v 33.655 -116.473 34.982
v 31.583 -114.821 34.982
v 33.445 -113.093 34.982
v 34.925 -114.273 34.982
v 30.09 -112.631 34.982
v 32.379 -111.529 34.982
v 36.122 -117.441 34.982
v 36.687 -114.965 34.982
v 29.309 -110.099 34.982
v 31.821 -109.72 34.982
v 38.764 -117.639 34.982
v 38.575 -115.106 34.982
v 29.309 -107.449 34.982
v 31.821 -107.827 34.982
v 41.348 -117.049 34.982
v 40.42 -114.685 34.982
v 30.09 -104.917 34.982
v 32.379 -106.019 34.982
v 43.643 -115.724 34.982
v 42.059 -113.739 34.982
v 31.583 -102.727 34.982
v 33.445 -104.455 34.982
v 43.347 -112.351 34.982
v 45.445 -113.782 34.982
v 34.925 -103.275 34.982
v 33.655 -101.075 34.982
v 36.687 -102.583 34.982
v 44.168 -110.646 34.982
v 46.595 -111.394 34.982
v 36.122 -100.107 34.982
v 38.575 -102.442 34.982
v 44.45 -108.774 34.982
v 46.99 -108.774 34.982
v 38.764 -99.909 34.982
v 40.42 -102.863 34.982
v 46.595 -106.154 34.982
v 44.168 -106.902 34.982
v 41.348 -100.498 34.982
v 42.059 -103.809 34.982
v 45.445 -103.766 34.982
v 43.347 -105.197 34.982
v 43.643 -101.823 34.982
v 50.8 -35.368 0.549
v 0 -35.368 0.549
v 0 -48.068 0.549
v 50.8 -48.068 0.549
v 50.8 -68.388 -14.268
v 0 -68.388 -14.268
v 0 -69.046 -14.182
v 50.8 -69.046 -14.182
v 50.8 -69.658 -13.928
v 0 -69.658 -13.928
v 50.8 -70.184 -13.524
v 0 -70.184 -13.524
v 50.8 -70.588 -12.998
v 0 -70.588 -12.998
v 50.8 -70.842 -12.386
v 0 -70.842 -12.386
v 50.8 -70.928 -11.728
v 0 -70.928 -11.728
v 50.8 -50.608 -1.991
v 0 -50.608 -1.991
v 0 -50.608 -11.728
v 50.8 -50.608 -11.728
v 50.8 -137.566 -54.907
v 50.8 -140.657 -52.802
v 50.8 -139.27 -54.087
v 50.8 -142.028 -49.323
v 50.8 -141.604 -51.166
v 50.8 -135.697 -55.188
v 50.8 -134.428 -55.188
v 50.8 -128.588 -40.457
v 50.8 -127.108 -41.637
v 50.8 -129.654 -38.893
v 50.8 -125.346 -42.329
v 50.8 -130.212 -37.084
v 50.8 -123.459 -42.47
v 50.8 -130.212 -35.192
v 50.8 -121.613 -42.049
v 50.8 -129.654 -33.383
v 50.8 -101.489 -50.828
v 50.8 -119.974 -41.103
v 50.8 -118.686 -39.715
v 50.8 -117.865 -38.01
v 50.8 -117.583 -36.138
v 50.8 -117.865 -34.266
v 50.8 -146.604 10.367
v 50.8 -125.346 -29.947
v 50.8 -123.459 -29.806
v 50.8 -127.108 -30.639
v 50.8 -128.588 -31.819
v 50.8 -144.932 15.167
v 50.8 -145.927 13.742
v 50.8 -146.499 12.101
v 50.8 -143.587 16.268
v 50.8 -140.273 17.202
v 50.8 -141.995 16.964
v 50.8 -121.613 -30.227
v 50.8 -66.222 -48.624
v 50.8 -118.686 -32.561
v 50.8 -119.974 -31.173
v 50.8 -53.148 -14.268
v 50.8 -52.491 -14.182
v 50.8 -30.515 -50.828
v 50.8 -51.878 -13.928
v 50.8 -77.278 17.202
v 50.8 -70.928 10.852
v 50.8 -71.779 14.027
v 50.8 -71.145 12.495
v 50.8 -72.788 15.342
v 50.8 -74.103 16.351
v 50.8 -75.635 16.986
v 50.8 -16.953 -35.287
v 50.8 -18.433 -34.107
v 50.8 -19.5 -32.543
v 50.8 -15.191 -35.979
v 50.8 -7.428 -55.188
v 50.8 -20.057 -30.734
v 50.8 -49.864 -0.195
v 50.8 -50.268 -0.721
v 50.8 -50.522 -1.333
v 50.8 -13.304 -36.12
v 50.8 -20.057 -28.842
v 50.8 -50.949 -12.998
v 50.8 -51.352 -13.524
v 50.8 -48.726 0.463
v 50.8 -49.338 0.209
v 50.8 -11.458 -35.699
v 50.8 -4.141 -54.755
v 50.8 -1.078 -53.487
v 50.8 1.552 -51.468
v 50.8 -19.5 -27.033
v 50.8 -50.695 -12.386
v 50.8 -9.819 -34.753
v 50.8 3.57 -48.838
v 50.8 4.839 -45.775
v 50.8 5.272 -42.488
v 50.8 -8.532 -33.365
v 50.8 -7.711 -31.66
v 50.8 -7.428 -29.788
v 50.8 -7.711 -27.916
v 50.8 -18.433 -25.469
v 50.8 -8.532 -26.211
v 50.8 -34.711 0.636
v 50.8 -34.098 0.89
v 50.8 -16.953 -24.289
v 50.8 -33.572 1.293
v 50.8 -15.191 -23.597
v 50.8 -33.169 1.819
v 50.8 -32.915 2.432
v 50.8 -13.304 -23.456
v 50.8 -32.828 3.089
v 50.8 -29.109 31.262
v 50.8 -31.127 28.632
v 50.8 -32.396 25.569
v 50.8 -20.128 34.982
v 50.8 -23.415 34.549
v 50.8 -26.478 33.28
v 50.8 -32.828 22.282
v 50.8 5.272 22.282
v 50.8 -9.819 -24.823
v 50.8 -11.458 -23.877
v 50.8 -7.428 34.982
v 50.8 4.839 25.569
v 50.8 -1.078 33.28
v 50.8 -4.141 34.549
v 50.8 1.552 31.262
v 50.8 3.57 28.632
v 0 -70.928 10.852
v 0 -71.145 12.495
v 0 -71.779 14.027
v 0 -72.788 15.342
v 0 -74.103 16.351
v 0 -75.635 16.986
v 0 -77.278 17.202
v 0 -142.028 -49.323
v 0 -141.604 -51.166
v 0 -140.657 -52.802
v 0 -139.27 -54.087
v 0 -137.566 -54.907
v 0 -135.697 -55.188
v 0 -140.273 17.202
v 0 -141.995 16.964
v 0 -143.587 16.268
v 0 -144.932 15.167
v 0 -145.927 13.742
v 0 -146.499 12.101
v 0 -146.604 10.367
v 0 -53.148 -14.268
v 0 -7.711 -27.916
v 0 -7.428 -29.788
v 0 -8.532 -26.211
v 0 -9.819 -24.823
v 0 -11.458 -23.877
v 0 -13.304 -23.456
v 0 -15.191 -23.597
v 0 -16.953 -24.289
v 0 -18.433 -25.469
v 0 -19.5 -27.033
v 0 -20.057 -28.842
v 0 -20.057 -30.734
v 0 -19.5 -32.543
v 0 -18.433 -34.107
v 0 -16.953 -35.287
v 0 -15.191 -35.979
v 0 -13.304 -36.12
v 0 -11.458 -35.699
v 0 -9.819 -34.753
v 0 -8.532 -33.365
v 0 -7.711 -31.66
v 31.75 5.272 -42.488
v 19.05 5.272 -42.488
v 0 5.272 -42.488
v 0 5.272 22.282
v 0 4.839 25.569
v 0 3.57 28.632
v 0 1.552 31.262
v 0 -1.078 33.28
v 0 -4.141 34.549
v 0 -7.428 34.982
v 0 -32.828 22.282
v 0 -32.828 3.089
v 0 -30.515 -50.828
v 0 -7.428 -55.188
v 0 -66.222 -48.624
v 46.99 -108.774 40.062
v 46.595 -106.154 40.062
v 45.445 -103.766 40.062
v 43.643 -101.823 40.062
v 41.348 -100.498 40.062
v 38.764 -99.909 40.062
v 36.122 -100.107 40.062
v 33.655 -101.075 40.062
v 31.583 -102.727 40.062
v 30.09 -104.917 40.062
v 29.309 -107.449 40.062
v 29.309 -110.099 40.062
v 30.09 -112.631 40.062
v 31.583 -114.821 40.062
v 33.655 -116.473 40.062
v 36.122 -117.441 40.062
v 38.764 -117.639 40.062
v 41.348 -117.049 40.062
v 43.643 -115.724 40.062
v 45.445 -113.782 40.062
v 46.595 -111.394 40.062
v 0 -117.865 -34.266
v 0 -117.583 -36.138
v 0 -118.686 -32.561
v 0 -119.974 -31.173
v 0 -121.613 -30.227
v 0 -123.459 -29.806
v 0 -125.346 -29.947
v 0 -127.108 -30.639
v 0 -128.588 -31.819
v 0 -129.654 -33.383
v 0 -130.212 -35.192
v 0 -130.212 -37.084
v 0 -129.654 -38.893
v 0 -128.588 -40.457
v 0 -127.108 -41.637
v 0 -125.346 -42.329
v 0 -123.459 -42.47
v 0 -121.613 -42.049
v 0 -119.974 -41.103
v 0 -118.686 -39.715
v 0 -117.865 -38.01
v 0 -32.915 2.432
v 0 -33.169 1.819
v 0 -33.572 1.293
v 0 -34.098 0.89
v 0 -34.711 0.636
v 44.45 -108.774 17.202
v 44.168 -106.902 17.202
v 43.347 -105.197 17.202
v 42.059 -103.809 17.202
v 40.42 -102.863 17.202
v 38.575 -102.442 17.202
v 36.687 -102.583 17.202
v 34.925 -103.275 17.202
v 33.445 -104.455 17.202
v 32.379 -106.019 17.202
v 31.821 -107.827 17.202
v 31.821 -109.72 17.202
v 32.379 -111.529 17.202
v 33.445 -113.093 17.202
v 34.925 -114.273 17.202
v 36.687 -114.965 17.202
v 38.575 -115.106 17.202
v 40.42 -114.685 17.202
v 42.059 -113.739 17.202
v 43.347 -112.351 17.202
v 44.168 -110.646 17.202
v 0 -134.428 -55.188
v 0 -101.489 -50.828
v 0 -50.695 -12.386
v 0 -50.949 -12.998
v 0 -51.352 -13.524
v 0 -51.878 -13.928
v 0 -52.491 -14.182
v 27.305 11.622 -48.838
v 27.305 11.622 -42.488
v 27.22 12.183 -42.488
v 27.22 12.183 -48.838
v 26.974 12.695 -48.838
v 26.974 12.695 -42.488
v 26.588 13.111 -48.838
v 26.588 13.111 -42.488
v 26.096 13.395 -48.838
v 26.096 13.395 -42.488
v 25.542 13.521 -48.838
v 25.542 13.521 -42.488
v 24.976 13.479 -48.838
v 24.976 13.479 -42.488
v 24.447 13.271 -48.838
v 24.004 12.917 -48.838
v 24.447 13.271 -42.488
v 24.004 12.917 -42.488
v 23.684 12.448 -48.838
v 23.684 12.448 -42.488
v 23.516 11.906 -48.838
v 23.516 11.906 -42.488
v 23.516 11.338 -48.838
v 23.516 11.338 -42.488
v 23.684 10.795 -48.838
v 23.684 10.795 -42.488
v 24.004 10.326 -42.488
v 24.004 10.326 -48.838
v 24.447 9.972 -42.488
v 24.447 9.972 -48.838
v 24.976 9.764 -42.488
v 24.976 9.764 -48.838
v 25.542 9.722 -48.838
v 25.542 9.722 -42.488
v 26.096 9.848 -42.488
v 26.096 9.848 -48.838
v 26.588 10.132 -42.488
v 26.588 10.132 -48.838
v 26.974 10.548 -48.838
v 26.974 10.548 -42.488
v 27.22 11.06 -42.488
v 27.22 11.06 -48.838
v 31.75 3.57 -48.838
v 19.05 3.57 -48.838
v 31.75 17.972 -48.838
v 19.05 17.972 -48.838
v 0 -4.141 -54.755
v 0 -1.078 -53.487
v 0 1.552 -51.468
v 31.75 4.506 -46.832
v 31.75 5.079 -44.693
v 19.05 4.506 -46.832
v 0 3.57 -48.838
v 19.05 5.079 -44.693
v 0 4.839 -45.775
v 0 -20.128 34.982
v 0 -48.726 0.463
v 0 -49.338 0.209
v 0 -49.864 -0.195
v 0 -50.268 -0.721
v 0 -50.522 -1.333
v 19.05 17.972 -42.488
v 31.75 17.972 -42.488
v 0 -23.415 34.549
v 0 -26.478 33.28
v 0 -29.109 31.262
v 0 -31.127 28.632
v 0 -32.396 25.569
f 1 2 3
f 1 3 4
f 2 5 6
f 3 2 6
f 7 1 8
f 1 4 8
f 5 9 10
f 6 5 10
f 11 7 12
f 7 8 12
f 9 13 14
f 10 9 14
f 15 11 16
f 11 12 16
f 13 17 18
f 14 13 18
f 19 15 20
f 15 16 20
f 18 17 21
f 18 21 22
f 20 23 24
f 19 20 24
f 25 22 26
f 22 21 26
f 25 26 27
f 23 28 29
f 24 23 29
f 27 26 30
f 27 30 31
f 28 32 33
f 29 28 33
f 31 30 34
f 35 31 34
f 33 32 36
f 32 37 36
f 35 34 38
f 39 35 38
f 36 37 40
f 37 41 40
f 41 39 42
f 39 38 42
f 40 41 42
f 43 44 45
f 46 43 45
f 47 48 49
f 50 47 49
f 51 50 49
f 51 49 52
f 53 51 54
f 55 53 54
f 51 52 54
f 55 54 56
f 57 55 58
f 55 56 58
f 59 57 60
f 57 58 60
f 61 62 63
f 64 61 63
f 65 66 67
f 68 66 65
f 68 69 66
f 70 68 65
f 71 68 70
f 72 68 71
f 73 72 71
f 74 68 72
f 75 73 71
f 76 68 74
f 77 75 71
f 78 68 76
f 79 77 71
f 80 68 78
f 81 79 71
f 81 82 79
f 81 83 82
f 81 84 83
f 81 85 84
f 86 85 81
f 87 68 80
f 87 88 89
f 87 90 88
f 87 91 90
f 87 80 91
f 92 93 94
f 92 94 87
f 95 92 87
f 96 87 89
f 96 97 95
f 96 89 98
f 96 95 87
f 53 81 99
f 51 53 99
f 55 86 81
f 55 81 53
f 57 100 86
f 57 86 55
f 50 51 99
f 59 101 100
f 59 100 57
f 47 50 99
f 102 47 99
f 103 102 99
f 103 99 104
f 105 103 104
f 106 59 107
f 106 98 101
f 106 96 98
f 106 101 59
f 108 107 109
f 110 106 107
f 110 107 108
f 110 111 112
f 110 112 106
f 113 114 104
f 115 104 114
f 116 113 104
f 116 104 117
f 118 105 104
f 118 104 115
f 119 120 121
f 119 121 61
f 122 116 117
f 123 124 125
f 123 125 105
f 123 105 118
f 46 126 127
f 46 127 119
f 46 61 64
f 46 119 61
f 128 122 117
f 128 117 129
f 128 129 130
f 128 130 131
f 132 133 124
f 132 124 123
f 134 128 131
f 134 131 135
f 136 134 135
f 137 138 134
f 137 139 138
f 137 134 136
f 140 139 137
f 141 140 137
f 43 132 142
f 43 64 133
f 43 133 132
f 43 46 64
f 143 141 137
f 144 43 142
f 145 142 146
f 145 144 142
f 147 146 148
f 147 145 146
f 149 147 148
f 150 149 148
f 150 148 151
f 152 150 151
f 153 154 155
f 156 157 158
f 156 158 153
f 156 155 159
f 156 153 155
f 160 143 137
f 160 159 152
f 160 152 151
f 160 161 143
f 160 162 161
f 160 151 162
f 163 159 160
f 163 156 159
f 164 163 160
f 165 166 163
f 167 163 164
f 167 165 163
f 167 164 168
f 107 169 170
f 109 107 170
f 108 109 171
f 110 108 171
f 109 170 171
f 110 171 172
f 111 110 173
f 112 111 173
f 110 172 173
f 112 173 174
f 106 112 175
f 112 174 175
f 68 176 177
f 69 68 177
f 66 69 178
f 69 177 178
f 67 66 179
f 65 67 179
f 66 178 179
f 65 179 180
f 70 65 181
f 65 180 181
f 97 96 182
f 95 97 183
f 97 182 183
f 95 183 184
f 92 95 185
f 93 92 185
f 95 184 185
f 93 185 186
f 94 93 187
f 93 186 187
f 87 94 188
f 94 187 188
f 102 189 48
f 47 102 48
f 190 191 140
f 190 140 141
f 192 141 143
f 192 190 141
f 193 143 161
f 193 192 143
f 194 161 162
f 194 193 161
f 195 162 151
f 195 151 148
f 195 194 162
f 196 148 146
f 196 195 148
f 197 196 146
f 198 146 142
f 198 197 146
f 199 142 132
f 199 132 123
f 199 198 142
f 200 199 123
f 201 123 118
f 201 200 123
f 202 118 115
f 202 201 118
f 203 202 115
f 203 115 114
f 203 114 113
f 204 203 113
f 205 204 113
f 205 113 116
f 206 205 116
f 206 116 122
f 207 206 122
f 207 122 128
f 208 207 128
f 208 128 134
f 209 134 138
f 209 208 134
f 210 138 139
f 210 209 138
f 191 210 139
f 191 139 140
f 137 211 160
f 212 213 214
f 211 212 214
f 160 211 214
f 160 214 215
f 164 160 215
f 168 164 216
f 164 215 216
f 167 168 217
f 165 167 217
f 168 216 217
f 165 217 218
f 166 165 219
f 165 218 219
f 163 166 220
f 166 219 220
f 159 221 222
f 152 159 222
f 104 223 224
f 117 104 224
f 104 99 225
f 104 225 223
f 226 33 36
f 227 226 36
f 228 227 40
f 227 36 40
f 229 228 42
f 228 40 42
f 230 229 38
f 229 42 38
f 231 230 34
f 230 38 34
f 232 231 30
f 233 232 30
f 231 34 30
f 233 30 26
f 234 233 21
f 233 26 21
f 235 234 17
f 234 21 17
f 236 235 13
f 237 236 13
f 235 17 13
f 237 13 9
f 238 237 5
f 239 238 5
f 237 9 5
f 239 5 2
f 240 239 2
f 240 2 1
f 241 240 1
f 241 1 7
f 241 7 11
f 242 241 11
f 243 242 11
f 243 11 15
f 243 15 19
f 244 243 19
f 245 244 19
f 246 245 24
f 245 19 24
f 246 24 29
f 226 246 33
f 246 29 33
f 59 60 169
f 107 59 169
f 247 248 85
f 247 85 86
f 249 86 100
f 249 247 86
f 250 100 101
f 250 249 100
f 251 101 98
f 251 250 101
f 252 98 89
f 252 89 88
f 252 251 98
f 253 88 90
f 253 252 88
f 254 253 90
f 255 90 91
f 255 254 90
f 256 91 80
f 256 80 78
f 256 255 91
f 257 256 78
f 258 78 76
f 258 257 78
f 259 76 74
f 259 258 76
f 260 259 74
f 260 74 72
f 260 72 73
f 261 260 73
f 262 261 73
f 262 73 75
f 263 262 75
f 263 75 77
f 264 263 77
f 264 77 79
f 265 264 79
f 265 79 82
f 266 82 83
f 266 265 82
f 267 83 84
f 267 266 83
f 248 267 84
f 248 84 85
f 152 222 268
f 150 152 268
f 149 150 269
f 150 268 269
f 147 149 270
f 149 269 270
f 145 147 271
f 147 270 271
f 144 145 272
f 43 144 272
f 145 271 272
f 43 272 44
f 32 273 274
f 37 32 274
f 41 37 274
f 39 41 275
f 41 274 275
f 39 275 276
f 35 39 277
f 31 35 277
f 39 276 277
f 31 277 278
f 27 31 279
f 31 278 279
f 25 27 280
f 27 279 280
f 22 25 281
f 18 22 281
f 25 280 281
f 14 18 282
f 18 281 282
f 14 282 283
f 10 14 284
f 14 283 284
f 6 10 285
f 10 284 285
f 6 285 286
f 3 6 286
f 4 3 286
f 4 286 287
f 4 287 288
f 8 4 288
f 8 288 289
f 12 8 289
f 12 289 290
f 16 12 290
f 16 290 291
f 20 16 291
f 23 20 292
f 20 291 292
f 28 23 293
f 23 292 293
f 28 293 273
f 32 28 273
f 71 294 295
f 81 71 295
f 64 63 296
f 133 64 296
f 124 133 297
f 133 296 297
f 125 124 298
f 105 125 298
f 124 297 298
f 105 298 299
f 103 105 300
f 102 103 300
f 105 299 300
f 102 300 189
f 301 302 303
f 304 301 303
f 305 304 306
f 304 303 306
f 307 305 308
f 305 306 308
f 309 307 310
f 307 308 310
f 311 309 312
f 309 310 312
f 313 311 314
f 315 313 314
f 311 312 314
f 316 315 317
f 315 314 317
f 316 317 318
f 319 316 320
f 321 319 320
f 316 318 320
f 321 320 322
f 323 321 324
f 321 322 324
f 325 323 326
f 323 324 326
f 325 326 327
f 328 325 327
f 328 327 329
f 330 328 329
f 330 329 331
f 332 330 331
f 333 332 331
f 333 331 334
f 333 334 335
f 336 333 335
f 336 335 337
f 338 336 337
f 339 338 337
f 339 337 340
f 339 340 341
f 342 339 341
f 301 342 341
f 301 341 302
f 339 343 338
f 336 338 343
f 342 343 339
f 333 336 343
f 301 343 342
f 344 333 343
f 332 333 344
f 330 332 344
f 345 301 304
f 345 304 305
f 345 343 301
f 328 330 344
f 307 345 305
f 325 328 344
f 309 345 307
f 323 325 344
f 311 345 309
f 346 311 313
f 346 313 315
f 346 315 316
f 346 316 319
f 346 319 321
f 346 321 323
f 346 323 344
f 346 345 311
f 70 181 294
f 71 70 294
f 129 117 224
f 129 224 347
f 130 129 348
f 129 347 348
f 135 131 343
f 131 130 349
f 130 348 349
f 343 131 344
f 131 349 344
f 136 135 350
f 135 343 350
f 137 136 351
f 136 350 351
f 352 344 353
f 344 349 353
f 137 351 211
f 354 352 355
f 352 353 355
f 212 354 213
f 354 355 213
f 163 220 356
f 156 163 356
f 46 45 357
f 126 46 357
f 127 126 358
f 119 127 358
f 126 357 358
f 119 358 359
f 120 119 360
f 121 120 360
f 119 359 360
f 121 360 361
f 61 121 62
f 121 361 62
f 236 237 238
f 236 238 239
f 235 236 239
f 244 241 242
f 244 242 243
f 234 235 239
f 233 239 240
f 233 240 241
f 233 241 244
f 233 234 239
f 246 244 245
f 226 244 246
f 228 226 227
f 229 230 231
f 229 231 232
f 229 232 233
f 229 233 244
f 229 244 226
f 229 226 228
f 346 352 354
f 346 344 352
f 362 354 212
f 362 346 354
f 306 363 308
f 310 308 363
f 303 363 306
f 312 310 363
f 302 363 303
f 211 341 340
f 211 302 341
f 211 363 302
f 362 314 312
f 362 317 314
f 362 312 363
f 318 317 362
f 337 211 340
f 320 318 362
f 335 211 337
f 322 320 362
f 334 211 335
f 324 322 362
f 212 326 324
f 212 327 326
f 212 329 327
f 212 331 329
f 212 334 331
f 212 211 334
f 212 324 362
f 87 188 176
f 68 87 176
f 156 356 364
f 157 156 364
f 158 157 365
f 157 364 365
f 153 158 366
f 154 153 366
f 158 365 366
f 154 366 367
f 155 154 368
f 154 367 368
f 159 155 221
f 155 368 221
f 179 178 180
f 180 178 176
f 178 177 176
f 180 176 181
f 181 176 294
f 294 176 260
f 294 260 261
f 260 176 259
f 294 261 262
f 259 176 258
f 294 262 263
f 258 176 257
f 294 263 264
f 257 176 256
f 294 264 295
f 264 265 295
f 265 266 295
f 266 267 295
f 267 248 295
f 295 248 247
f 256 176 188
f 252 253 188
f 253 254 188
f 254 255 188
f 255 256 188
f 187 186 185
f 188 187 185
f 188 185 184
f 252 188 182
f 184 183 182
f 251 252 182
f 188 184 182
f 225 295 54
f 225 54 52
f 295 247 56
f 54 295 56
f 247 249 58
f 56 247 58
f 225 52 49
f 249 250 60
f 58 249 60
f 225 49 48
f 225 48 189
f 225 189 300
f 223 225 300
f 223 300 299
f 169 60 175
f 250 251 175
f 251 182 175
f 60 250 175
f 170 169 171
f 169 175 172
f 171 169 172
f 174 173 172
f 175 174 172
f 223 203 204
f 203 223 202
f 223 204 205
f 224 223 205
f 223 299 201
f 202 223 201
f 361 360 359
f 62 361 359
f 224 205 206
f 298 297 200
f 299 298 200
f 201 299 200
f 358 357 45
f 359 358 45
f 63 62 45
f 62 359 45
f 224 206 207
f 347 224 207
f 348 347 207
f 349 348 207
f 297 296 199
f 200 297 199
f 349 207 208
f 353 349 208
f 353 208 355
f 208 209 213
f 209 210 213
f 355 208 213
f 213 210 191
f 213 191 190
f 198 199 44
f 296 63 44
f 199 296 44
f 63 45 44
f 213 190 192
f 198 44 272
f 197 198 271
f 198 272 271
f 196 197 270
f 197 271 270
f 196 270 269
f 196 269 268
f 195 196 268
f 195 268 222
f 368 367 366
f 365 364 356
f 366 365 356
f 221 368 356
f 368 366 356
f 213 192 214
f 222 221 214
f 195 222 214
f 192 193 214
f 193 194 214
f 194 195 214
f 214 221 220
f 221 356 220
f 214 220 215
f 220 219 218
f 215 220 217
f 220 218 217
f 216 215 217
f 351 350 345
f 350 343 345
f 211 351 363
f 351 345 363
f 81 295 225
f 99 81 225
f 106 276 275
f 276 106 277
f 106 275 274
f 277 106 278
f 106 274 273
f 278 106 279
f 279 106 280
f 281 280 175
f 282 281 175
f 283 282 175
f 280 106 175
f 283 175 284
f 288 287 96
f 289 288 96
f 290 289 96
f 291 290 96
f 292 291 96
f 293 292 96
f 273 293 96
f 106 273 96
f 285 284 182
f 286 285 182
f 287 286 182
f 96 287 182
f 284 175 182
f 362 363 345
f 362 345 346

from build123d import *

# Parameters (mm, degrees)
F0_R          = 6.35
F1_DEPTH      = 50.8
F2_R          = 6.35
F3_DEPTH      = 17.78
F4_R          = 8.89
F4_R_2        = 6.35
F5_DEPTH      = 5.08
F6_W          = 12.7
F6_H          = 6.35
F7_DEPTH      = 12.7
F7_DEPTH_BACK = 25.4
F8_R          = 1.905
F9_DEPTH      = 12.7


with BuildPart() as f1:
    # F0 (on Right) → F1 (new body)
    with BuildSketch(Plane.YZ):
        with BuildLine():
            Line((-7.428396, 34.981928), (-20.128396, 34.981928))
            ThreePointArc((-20.128396, 34.981928), (-29.108653, 31.262184), (-32.828396, 22.281928))
            Line((-32.828396, 22.281928), (-32.828396, 3.089348))
            ThreePointArc((-32.828396, 3.089348), (-33.572345, 1.293297), (-35.368396, 0.549348))
            Line((-35.368396, 0.549348), (-48.068396, 0.549348))
            ThreePointArc((-48.068396, 0.549348), (-49.864448, -0.194601), (-50.608396, -1.990652))
            Line((-50.608396, -1.990652), (-50.608396, -11.728213))
            ThreePointArc((-50.608396, -11.728213), (-51.352345, -13.524265), (-53.148396, -14.268213))
            Line((-53.148396, -14.268213), (-68.388396, -14.268213))
            ThreePointArc((-68.388396, -14.268213), (-70.184448, -13.524265), (-70.928396, -11.728213))
            Line((-70.928396, -11.728213), (-70.928396, 10.851928))
            ThreePointArc((-70.928396, 10.851928), (-72.788268, 15.342056), (-77.278396, 17.201928))
            Line((-77.278396, 17.201928), (-139.508396, 17.201928))
            Line((-139.508396, 17.201928), (-140.272923, 17.201928))
            ThreePointArc((-140.272923, 17.201928), (-144.931511, 15.167024), (-146.604342, 10.366514))
            Line((-146.604342, 10.366514), (-142.028059, -49.323486))
            ThreePointArc((-142.028059, -49.323486), (-140.011736, -53.49666), (-135.69664, -55.188072))
            Line((-135.69664, -55.188072), (-134.428396, -55.188072))
            Line((-134.428396, -55.188072), (-101.488806, -50.828371))
            Line((-101.488806, -50.828371), (-66.222131, -48.624206))
            Line((-66.222131, -48.624206), (-30.514626, -50.828371))
            Line((-30.514626, -50.828371), (-7.428396, -55.188072))
            ThreePointArc((-7.428396, -55.188072), (1.55186, -51.468328), (5.271604, -42.488072))
            Line((5.271604, -42.488072), (5.271604, 22.281928))
            ThreePointArc((5.271604, 22.281928), (1.55186, 31.262184), (-7.428396, 34.981928))
        make_face()
        with Locations((-123.933047, -36.138072)):
            Circle(F0_R, mode=Mode.SUBTRACT)
        with Locations((-13.778396, -29.788072)):
            Circle(F0_R, mode=Mode.SUBTRACT)
    extrude(amount=F1_DEPTH)

    # F2 (on face) → F3 (join)
    with BuildSketch(Plane.XY.offset(17.201928)):
        with Locations((38.1, -108.77391)):
            Circle(F2_R)
    extrude(amount=F3_DEPTH)

    # F4 (on face) → F5 (join)
    with BuildSketch(Plane.XY.offset(34.981928)):
        with Locations((38.1, -108.77391)):
            Circle(F4_R)
        with Locations((38.1, -108.77391)):
            Circle(F4_R_2, mode=Mode.SUBTRACT)
        with Locations((38.1, -108.77391)):
            Circle(F4_R_2)
    extrude(amount=F5_DEPTH)

    # F6 (on face) → F7 (join, two sides)
    with BuildSketch(Plane(origin=(0, 5.271604, 0), x_dir=(-1, 0, 0), z_dir=(0, 1, 0))) as f7_sk:
        with Locations((-25.4, -45.663072)):
            Rectangle(F6_W, F6_H)
    extrude(amount=F7_DEPTH)
    extrude(f7_sk.sketch, amount=-F7_DEPTH_BACK)

    # F8 (on face) → F9 (cut)
    with BuildSketch(Plane.XY.offset(-42.488072)):
        with Locations((25.4, 11.621604)):
            Circle(F8_R)
    extrude(amount=-F9_DEPTH, mode=Mode.SUBTRACT)


solid = f1.part
